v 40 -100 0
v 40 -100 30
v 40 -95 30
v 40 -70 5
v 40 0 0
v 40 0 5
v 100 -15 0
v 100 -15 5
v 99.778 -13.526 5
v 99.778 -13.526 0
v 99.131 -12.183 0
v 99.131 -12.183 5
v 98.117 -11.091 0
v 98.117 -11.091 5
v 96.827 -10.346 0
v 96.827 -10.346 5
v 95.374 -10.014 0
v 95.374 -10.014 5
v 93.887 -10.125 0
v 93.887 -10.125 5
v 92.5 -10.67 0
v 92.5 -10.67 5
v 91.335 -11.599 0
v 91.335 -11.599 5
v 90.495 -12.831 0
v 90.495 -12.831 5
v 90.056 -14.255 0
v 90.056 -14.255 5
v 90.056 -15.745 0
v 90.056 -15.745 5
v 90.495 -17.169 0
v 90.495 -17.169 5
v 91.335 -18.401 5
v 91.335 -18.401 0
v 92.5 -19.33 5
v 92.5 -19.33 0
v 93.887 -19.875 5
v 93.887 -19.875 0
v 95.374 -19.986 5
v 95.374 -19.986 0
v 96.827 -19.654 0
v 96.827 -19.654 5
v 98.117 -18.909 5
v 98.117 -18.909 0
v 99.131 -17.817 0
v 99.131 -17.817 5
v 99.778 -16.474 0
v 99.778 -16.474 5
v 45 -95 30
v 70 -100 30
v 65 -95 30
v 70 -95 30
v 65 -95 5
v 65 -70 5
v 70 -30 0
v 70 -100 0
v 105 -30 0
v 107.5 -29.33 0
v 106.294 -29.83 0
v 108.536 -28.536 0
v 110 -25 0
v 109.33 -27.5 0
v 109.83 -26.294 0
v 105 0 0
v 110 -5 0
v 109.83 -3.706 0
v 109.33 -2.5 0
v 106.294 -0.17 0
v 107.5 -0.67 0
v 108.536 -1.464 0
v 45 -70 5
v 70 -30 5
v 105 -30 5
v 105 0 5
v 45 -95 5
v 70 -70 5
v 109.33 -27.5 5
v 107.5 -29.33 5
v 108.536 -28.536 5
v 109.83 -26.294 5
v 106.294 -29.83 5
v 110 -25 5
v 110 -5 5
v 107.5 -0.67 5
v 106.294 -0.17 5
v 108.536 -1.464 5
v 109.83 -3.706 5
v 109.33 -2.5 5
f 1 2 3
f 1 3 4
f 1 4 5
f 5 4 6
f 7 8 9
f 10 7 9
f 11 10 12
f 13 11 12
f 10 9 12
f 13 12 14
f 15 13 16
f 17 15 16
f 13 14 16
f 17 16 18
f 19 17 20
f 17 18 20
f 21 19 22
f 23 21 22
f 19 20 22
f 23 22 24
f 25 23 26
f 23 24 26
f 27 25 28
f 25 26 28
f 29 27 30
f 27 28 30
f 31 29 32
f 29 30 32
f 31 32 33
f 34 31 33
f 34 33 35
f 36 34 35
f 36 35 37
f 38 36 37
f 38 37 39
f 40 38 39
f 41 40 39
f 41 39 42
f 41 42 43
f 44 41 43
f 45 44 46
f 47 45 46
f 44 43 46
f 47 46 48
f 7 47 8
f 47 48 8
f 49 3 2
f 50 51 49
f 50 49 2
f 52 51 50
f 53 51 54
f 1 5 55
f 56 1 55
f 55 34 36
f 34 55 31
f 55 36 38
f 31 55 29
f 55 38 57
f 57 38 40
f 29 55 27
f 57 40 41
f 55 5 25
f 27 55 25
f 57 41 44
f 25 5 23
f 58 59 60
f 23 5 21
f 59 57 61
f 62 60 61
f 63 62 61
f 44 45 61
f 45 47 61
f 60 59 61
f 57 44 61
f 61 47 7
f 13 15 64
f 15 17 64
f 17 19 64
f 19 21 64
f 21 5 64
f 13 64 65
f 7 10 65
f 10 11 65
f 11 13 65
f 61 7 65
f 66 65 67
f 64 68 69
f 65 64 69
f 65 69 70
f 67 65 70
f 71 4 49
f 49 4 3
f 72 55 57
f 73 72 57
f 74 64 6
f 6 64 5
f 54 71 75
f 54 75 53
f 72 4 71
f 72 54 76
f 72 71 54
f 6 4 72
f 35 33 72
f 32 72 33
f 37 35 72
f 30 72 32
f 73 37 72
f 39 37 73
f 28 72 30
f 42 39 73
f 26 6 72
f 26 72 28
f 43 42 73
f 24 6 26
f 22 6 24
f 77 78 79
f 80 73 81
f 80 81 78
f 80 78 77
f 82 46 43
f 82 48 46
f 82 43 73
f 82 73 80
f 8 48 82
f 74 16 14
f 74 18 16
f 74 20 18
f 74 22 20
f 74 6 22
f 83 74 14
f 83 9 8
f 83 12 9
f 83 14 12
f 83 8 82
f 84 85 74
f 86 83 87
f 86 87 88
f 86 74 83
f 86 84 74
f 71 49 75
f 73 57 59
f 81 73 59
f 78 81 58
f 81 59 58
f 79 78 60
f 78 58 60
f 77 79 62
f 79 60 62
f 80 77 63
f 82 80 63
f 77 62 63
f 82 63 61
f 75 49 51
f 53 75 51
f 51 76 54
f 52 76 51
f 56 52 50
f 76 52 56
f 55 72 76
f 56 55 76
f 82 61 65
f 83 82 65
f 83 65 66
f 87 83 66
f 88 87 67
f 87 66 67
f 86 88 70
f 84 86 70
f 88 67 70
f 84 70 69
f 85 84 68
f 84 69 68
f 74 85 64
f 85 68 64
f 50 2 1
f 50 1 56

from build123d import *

# Parameters (mm, degrees)
BOSS_EXTRUDE1_DEPTH = 5
SKETCH2_R           = 5
CUT_EXTRUDE1_DEPTH  = 10
SKETCH3_W           = 30
SKETCH3_H           = 30
BOSS_EXTRUDE2_DEPTH = 5
BOSS_EXTRUDE3_DEPTH = 5
SKETCH6_R           = 5
CUT_EXTRUDE2_DEPTH  = 5
SKETCH7_W           = 46.54134698
SKETCH7_H           = 34.044615897
CUT_EXTRUDE3_DEPTH  = 5


with BuildPart() as part:
    # Sketch1 → Boss-Extrude1 (new body)
    with BuildSketch(Plane.XY):
        with BuildLine():
            Line((5, 0), (70, 0))
            Line((70, 0), (70, -30))
            Line((70, -30), (70, -95))
            Line((70, -95), (40, -95))
            Line((40, -95), (40, -30))
            Line((40, -30), (5, -30))
            ThreePointArc((5, -30), (1.464466094, -28.535533906), (0, -25))
            Line((0, -25), (0, -5))
            ThreePointArc((0, -5), (1.464466094, -1.464466094), (5, 0))
        make_face()
    boss_extrude1 = extrude(amount=BOSS_EXTRUDE1_DEPTH)

    # Sketch2 → Cut-Extrude1 (cut)
    with BuildSketch(Plane.XY.offset(5)):
        with Locations((15, -15)):
            Circle(SKETCH2_R)
    extrude(amount=-CUT_EXTRUDE1_DEPTH, mode=Mode.SUBTRACT)

    # Sketch3 → Boss-Extrude2 (add)
    with BuildSketch(Plane.XZ.offset(95)):
        with Locations((55, 15)):
            Rectangle(SKETCH3_W, SKETCH3_H)
    extrude(amount=BOSS_EXTRUDE2_DEPTH)

    # Sketch4 → Boss-Extrude3 (add)
    with BuildSketch(Plane.ZY.offset(-40)):
        Polygon((5, -70), (30, -95), (5, -95), align=None)
    boss_extrude3 = extrude(amount=-BOSS_EXTRUDE3_DEPTH)

    # Mirror1: Boss-Extrude3 across plane
    add(boss_extrude3.mirror(Plane.ZY.offset(-55)))

    # Mirror2: Boss-Extrude1 across plane
    add(boss_extrude1.mirror(Plane.ZY.offset(-55)))

    # Sketch6 → Cut-Extrude2 (cut)
    with BuildSketch(Plane.XY.offset(5)):
        with Locations((95, -15)):
            Circle(SKETCH6_R)
    extrude(amount=-CUT_EXTRUDE2_DEPTH, mode=Mode.SUBTRACT)

    # Sketch7 → Cut-Extrude3 (cut)
    with BuildSketch(Plane.XY.offset(5)):
        with Locations((16.72932651, -12.977692052)):
            Rectangle(SKETCH7_W, SKETCH7_H)
    extrude(amount=-CUT_EXTRUDE3_DEPTH, mode=Mode.SUBTRACT)


solid = part.part
